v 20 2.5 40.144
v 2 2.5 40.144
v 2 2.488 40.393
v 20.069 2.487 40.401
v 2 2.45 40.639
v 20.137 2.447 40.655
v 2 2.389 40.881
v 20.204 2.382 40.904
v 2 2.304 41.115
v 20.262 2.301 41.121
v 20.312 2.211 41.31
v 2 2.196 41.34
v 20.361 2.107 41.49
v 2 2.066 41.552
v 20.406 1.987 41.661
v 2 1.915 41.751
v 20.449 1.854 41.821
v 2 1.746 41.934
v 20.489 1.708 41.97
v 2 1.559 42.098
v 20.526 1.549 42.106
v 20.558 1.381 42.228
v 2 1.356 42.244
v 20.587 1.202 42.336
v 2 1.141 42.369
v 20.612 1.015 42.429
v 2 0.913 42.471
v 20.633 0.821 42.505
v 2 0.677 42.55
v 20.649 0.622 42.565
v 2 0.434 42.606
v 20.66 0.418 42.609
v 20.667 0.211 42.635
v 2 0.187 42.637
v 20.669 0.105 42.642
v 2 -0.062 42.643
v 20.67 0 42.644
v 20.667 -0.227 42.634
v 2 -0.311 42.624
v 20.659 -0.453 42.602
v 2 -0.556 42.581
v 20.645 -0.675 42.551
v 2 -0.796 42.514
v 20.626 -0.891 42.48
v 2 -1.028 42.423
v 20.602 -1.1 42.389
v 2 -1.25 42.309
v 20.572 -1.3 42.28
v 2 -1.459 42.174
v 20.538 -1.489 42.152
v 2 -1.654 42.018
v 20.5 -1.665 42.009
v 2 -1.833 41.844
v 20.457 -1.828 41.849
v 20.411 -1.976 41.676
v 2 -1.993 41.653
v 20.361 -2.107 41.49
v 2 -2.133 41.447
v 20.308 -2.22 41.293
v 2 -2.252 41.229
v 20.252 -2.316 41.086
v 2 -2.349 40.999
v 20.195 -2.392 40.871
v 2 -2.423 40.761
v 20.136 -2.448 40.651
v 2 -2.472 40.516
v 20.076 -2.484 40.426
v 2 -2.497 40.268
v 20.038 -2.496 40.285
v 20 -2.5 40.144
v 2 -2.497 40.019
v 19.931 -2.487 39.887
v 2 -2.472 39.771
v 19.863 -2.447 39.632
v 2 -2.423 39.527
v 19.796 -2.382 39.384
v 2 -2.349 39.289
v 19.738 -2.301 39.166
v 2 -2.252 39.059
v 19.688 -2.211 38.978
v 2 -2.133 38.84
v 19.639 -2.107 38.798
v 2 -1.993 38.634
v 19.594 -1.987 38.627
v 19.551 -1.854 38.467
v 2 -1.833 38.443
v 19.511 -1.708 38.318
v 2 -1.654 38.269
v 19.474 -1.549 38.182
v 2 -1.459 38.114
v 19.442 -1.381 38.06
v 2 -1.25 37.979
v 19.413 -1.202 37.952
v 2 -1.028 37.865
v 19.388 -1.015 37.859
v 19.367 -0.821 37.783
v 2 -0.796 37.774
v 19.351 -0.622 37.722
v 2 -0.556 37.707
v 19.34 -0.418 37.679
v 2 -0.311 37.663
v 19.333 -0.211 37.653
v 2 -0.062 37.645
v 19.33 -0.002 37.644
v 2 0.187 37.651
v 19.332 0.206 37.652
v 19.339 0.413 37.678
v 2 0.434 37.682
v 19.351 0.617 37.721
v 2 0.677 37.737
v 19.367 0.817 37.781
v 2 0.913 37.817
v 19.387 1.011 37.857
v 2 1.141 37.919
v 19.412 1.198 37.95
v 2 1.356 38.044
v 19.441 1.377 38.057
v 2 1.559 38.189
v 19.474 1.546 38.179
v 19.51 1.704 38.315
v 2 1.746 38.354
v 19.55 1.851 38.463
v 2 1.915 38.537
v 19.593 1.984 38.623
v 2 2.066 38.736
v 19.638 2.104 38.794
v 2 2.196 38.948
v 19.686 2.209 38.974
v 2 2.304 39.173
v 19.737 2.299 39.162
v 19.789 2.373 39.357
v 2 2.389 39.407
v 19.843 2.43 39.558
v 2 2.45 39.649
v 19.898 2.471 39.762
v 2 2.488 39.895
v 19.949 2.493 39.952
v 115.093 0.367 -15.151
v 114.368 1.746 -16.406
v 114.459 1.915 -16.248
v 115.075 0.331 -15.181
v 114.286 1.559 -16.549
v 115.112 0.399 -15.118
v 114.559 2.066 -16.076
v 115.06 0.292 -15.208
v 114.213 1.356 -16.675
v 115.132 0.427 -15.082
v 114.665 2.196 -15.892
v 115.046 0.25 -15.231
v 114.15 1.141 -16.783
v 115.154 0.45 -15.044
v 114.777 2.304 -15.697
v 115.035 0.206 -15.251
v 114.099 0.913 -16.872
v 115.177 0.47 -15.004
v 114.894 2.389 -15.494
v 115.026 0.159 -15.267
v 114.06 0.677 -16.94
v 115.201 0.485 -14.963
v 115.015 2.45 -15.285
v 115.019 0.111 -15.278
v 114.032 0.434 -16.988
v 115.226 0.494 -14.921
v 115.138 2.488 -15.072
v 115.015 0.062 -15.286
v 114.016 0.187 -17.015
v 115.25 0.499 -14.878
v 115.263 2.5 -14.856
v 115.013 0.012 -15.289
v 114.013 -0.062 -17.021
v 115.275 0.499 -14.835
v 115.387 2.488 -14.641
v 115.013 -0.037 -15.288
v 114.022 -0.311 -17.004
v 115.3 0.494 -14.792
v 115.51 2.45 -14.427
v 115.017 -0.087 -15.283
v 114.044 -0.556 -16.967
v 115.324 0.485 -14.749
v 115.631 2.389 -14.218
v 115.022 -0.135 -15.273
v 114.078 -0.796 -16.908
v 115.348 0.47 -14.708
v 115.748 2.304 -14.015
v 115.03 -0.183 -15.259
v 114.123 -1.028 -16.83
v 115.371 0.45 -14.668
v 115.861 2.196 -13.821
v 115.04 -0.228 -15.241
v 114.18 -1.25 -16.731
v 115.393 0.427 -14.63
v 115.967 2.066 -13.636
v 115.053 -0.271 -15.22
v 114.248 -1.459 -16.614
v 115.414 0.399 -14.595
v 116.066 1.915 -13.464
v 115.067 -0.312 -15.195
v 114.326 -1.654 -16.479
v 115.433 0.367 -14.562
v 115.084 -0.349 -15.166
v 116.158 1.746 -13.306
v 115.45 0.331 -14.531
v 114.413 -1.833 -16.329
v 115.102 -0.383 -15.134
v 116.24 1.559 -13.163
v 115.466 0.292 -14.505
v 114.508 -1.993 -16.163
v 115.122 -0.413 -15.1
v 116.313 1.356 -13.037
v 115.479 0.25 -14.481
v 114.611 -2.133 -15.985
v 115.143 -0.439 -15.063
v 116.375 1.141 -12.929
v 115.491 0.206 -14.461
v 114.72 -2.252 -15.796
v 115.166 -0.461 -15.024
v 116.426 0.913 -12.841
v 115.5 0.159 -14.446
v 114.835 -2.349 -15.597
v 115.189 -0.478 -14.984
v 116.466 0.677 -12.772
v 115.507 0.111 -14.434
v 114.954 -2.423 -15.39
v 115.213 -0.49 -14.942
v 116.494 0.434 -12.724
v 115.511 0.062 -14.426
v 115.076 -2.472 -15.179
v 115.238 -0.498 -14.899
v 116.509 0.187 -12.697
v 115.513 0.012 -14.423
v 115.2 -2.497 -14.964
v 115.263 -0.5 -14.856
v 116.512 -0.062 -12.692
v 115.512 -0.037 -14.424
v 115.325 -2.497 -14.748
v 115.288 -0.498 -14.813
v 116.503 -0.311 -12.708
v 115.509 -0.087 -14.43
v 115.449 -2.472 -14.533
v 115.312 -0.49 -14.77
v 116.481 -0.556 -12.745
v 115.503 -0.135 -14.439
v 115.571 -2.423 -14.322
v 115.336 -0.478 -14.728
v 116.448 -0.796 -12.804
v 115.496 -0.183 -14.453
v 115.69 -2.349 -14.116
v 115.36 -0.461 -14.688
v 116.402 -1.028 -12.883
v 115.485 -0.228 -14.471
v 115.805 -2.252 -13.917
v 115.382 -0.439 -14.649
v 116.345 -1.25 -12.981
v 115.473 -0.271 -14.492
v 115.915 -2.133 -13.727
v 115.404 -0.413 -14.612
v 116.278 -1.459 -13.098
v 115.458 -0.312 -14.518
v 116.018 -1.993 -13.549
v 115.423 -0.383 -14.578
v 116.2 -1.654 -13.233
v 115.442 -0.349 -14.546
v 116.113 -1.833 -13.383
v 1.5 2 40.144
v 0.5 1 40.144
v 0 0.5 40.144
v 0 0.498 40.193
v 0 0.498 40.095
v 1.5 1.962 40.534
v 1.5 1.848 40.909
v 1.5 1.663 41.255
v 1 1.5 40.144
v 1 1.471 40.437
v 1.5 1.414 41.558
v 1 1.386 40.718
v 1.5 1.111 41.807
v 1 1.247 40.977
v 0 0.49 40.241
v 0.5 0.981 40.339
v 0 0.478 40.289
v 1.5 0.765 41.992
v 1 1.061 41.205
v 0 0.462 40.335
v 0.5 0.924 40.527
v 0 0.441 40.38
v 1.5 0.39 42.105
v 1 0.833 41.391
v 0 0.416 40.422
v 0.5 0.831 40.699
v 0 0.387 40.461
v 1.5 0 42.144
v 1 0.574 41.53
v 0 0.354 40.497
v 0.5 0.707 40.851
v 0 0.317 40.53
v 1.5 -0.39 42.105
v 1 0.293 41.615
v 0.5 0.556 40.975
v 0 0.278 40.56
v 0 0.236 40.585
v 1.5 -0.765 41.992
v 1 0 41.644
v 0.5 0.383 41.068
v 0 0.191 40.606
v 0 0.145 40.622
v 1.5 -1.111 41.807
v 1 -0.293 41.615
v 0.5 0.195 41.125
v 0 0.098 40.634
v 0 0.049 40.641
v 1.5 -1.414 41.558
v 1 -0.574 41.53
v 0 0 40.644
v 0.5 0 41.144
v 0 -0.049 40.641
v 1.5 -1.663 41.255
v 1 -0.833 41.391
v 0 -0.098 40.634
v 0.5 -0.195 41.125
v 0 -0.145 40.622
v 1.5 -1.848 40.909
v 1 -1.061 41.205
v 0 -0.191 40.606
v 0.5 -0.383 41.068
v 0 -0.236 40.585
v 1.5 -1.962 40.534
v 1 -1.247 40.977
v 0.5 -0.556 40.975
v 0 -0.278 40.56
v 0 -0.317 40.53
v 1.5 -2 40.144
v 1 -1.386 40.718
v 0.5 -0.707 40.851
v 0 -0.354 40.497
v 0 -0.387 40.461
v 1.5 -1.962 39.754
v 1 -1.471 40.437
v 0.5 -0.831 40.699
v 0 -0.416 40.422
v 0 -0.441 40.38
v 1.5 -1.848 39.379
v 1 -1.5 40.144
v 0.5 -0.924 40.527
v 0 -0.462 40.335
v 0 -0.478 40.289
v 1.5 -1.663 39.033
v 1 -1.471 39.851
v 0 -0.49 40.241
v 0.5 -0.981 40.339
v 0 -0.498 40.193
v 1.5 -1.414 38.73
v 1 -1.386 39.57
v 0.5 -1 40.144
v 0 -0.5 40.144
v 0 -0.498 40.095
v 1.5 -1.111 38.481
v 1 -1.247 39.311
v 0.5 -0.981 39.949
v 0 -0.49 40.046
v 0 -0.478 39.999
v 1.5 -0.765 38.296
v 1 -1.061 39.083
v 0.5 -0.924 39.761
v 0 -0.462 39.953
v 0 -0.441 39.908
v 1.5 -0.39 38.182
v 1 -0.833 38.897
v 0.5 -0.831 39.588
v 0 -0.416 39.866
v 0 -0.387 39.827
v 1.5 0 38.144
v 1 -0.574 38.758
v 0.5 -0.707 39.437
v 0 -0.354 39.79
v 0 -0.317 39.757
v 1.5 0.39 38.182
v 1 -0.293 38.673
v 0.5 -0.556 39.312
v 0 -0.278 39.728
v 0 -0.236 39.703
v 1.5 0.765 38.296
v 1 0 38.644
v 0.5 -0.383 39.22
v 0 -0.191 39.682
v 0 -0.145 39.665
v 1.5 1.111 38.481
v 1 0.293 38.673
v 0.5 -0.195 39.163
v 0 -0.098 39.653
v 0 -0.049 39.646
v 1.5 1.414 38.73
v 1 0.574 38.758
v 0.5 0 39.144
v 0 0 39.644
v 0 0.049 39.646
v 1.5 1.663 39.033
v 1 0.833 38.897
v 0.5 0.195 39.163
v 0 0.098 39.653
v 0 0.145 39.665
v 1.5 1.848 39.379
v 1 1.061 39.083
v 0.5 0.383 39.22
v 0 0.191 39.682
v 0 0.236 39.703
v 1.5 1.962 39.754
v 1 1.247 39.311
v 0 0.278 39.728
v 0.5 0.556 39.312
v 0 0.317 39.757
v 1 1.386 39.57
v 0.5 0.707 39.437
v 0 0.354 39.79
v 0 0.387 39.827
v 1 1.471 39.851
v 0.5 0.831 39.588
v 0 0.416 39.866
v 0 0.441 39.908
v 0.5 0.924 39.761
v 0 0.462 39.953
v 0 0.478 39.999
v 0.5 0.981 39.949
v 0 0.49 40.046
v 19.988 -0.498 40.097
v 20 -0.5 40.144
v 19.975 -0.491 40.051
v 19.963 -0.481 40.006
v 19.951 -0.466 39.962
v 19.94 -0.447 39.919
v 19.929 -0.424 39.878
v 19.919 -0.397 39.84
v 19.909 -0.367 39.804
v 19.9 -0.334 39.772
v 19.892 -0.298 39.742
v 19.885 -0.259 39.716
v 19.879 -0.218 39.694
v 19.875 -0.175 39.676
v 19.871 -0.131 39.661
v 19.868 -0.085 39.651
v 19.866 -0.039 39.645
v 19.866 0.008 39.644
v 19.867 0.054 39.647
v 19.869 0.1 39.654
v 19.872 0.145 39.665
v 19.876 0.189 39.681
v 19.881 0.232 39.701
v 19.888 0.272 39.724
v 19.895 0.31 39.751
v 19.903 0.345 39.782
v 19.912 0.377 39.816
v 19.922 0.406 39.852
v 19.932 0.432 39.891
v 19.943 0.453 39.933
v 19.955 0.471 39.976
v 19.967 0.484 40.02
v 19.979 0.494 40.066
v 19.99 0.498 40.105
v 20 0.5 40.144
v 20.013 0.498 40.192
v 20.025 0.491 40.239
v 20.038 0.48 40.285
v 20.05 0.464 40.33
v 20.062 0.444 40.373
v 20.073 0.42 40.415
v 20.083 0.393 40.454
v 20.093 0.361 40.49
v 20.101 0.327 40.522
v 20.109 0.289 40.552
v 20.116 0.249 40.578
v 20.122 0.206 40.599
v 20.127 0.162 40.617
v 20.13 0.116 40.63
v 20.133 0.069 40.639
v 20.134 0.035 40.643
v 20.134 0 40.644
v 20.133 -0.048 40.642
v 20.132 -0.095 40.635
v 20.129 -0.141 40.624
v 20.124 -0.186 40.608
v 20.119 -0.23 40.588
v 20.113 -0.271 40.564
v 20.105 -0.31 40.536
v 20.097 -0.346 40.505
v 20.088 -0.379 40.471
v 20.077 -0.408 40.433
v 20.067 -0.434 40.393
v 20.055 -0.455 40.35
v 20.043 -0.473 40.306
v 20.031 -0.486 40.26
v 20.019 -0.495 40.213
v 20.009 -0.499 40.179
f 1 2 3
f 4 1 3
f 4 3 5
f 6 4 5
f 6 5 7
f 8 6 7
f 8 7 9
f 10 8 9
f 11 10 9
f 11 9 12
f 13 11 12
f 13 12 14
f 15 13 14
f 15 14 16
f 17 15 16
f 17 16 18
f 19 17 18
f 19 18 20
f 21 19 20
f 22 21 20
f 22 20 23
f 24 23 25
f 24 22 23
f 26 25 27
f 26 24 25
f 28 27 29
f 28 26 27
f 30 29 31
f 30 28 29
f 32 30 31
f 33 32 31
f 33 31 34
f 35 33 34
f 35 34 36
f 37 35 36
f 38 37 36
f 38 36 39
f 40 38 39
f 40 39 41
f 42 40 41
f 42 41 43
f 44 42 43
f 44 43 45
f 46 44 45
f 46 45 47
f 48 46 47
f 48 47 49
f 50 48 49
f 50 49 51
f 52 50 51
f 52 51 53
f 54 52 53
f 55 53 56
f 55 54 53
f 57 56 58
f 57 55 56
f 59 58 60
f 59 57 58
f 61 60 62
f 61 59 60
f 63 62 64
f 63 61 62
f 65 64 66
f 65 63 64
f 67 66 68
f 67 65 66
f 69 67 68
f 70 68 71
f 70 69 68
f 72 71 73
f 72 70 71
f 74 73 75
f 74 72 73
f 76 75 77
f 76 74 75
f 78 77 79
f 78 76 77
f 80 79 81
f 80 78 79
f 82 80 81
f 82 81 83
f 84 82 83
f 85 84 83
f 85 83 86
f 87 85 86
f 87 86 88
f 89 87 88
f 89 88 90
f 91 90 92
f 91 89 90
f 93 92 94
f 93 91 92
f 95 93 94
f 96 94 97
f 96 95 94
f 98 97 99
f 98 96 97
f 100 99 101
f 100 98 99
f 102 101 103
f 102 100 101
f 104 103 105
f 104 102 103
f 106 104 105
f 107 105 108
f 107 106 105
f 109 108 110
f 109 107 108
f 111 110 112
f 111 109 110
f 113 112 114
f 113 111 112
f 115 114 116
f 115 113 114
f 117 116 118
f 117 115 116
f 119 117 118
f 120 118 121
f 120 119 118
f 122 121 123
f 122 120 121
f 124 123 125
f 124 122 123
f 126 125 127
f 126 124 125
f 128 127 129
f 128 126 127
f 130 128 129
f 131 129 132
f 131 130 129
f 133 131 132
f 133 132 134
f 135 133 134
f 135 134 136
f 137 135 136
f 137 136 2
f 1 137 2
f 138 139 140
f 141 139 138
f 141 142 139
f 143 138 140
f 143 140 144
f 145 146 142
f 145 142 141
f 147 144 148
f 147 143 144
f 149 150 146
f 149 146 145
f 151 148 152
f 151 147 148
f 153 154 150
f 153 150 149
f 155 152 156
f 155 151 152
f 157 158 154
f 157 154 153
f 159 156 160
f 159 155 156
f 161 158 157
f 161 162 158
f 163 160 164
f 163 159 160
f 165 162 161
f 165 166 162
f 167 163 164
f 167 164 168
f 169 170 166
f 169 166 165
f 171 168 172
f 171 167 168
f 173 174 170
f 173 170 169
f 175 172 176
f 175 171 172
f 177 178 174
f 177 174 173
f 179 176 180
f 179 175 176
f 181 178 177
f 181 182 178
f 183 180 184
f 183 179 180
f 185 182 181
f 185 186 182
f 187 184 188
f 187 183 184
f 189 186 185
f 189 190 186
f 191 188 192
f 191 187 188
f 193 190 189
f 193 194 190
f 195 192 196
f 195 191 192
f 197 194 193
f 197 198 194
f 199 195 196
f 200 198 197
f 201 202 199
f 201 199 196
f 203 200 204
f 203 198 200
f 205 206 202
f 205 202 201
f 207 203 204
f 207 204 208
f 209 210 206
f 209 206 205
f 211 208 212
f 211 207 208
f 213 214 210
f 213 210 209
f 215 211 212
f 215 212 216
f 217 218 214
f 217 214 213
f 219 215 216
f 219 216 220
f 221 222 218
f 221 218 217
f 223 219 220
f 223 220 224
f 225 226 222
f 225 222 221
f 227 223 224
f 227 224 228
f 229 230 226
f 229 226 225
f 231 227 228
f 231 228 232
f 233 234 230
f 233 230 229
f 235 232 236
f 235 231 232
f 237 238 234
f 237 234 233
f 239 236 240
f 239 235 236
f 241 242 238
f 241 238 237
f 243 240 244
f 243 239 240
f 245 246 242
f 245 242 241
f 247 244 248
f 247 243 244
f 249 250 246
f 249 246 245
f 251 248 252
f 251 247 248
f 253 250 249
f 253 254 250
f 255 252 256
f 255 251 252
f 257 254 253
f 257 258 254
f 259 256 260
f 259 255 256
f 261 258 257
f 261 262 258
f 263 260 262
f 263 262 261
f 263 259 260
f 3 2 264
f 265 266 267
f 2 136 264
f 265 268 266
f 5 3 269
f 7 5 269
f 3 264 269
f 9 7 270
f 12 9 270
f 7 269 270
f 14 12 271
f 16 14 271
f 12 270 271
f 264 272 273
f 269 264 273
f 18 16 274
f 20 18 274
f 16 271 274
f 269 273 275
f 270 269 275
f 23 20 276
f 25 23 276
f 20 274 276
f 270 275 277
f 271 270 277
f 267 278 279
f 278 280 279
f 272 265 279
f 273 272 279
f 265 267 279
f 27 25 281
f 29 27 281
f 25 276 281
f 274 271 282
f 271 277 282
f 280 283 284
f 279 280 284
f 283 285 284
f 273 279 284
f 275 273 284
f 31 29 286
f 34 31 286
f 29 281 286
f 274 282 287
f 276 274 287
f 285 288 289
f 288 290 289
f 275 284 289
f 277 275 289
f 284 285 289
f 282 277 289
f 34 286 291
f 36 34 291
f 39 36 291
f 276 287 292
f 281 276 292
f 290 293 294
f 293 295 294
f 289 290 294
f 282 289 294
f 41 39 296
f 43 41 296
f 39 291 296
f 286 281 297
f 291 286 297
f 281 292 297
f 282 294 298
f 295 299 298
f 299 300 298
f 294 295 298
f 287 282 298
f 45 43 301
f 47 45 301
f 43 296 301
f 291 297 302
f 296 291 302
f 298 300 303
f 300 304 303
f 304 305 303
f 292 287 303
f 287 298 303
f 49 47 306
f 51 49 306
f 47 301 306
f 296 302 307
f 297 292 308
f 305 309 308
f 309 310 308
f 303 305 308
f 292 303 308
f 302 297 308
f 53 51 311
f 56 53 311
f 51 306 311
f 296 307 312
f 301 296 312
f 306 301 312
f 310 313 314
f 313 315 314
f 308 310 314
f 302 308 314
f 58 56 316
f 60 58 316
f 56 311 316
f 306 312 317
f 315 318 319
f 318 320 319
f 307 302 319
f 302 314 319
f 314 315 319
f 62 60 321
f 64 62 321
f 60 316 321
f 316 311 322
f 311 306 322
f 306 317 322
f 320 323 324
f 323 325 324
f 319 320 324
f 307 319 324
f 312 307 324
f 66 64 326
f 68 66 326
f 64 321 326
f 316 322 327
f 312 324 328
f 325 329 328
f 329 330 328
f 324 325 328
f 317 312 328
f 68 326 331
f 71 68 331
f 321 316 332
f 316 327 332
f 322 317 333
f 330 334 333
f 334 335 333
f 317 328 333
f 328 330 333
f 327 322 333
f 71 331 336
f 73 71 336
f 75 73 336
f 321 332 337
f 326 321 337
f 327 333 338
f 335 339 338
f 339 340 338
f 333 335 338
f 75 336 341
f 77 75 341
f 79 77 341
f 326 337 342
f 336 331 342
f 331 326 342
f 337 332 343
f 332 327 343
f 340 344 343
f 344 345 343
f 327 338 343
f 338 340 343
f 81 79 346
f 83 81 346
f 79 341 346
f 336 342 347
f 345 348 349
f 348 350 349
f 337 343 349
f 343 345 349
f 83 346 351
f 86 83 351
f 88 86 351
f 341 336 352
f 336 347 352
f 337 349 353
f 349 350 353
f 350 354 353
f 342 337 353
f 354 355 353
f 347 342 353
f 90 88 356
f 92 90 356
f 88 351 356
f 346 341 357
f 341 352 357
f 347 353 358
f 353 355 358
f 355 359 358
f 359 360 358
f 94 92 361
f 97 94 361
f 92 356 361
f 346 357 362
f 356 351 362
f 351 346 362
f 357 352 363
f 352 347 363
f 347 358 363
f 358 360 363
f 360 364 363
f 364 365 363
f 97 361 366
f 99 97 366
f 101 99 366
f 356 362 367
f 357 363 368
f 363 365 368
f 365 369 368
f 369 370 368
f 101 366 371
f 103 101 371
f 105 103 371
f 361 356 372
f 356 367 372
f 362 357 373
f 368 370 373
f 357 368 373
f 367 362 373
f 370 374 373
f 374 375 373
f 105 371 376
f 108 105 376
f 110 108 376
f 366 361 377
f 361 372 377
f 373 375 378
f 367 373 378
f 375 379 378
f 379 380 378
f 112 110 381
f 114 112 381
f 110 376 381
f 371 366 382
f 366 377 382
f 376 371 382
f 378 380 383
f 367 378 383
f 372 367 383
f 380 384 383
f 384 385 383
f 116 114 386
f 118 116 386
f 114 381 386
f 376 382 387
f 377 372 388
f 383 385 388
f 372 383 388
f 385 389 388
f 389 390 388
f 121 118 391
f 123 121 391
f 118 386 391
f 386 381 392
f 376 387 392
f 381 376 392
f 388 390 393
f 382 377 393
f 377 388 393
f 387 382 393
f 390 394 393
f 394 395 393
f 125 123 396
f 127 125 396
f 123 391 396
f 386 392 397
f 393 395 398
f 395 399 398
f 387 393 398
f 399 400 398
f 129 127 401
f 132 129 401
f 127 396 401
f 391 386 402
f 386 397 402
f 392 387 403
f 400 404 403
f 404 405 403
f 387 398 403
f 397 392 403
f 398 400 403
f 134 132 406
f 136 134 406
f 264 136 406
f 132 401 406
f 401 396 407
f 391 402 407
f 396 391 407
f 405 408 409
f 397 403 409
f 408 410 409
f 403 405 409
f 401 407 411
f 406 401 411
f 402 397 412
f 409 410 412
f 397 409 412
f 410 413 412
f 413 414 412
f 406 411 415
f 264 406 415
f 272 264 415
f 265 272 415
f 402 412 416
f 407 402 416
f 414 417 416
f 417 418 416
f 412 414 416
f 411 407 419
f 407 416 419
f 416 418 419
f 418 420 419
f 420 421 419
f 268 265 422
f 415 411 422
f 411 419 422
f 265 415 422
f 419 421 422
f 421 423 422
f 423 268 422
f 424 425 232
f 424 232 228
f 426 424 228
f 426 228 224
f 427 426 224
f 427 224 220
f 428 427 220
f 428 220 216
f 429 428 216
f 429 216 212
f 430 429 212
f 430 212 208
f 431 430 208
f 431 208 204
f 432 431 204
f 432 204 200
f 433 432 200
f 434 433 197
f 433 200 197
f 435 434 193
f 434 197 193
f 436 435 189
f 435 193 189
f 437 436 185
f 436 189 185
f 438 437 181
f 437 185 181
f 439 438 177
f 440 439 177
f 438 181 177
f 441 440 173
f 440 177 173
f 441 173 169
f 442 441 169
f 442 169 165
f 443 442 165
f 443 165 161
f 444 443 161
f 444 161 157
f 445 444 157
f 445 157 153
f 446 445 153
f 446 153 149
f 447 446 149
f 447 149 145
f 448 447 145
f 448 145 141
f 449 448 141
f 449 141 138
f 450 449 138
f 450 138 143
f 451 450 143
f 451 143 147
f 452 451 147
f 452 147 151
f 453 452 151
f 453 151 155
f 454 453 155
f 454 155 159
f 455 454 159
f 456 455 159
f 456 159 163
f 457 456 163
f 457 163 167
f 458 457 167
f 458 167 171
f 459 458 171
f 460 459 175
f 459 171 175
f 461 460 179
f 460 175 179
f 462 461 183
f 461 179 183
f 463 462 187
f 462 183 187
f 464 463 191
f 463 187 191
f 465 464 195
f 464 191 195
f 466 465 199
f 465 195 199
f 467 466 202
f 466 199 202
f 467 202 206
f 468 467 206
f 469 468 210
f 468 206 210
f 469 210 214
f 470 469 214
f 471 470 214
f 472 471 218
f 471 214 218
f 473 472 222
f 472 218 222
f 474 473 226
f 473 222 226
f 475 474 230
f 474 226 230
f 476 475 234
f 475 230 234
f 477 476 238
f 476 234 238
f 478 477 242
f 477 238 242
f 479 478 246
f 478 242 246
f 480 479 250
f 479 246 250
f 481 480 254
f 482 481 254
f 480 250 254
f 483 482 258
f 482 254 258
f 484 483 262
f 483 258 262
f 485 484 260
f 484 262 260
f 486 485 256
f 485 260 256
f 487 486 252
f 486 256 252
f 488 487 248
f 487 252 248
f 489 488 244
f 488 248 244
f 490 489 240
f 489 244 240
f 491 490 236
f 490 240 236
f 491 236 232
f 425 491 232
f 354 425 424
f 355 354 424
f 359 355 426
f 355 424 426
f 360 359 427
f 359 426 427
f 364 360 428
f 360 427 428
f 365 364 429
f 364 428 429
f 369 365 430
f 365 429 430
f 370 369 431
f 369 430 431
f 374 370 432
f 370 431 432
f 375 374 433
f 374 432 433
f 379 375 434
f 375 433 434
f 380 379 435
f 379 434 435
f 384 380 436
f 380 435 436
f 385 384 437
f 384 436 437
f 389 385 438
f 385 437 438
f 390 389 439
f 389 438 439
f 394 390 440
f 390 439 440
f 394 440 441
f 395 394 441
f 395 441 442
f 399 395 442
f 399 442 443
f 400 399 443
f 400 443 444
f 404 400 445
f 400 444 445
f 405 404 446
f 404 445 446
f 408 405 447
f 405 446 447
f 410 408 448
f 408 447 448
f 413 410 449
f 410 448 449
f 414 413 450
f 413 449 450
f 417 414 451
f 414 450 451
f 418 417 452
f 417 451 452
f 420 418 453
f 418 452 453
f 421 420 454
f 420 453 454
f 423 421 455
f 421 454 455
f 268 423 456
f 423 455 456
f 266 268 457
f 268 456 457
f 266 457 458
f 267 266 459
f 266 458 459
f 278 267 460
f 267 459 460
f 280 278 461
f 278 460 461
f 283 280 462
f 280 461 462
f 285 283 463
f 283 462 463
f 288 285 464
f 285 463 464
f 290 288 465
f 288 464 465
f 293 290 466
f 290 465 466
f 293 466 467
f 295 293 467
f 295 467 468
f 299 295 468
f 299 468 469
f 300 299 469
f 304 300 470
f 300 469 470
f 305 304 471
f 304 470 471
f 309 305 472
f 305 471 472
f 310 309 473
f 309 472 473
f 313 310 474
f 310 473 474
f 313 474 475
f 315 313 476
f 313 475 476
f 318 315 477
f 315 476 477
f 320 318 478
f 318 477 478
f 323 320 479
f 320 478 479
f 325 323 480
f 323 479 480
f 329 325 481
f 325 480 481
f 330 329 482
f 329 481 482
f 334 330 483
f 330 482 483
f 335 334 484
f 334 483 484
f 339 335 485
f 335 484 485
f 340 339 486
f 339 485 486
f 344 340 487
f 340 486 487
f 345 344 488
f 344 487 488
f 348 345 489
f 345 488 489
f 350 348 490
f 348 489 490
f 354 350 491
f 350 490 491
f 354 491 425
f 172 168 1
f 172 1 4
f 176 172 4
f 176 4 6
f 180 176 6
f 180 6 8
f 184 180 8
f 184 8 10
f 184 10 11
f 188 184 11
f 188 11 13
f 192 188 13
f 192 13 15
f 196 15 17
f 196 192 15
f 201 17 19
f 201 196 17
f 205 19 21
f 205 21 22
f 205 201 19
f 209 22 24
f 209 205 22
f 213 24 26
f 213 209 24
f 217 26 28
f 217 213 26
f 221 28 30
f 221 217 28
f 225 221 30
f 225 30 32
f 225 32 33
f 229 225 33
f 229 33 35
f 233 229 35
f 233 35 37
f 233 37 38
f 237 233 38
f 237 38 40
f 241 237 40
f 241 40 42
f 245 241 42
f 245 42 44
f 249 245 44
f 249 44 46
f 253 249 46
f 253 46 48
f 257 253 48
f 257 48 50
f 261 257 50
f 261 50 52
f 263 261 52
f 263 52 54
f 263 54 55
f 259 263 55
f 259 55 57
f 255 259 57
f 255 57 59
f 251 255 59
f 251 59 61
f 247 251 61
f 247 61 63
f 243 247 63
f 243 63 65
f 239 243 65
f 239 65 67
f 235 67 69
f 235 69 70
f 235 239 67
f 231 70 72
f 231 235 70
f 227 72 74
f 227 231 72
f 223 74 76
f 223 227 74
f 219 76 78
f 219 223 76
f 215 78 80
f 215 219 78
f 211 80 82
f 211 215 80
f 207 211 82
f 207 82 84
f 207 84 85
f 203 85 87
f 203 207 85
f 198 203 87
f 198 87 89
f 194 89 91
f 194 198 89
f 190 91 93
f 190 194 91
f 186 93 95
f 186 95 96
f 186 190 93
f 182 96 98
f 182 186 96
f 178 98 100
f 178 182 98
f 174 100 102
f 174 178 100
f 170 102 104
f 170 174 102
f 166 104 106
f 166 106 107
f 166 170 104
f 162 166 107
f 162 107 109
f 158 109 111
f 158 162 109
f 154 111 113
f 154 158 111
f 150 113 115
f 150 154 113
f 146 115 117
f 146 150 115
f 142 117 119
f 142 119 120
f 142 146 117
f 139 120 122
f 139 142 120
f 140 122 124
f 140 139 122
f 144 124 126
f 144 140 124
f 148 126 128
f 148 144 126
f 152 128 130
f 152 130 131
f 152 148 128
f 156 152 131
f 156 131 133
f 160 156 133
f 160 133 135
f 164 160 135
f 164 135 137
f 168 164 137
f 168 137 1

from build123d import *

# Parameters (mm, degrees)
F1_R      = 2.5
F3_SIZE   = 2
F2_FACE_R = 0.5


with BuildPart() as f2:
    # F2: sweep along a path in F0
    with BuildLine(Plane.XZ) as f2_path:
        Line((0, 40.1438838244), (20, 40.1438838244))
        Line((20, 40.1438838244), (115.2627944163, -14.8561161756))
    # F1 (on Right) → F2 (sweep)
    with BuildSketch(Plane.YZ):
        with Locations((0, 40.1438838244)):
            Circle(F1_R)
    sweep(path=f2_path.line, transition=Transition.RIGHT)

    # F3
    f3_edges = [f2.edges().sort_by_distance(p)[0] for p in [
        (0, -2.5, 40.143884),
    ]]
    chamfer(f3_edges, length=F3_SIZE)

    # F4: sweep along a path in F0
    with BuildLine(Plane.XZ) as f4_path:
        Line((0, 40.1438838244), (20, 40.1438838244))
        Line((20, 40.1438838244), (115.2627944163, -14.8561161756))
    # F2_face (on face) → F4 (sweep, cut)
    with BuildSketch(Plane(origin=(0, 0, 40.1438838244), x_dir=(0, -1, 0), z_dir=(-1, 0, 0))):
        Circle(F2_FACE_R)
    sweep(path=f4_path.line, transition=Transition.RIGHT, mode=Mode.SUBTRACT)


solid = f2.part
